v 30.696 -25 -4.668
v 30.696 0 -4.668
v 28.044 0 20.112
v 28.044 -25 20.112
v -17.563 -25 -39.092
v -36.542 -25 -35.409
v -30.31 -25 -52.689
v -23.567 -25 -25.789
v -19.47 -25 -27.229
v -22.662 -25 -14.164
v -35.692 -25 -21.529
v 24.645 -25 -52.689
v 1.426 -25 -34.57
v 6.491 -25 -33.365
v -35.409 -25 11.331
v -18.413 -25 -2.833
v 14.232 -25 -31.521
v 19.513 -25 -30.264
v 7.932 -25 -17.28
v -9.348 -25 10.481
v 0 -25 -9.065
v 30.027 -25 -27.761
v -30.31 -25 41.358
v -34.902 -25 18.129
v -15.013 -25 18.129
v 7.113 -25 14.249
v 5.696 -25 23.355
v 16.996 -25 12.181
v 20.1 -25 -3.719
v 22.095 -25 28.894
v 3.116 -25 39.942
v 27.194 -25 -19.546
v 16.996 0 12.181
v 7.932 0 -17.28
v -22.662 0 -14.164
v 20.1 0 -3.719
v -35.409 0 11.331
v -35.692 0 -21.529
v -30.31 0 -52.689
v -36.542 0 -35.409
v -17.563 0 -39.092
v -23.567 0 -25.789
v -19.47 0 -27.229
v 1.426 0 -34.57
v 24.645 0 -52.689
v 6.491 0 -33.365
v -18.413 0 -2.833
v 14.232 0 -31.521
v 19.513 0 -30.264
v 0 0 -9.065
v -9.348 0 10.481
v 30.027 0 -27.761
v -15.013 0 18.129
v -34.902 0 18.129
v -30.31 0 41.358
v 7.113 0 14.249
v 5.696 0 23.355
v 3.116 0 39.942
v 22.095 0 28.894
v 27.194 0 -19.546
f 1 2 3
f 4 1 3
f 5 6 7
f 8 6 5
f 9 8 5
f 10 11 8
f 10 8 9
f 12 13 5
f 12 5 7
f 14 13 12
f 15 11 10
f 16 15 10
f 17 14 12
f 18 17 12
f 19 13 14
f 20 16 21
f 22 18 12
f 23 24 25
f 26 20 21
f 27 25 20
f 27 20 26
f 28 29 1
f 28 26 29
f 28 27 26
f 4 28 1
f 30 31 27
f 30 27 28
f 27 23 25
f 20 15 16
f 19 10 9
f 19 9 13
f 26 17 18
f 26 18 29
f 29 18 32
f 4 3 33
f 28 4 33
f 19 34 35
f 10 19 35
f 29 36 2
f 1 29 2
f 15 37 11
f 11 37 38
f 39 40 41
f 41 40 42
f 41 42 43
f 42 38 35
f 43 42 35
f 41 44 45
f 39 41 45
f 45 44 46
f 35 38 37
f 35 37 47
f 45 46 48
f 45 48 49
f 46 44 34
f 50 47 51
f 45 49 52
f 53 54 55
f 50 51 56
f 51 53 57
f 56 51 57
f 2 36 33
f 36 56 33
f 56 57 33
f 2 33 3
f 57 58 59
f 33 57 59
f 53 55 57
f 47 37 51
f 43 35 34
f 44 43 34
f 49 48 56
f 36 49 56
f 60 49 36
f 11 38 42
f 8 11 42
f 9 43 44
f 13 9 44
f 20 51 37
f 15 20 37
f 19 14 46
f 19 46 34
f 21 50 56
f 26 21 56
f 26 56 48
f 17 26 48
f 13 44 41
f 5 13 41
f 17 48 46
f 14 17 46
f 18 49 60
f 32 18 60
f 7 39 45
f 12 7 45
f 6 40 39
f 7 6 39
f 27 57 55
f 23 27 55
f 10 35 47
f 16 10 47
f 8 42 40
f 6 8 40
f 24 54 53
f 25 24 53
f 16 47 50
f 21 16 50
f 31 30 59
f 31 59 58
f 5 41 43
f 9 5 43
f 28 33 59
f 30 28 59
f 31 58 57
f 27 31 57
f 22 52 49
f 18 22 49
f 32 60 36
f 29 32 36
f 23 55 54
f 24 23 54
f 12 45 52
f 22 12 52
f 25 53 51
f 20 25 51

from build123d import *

# Parameters (mm, degrees)
F1_DEPTH = 25


with BuildPart() as f1:
    # F0 (on Front) → F1 (new body)
    with BuildSketch(Plane.XZ):
        Polygon((9.3355238921, 21.5350252004), (5.696185278, 23.3546947243), (7.112640961, 14.2489086105), align=None)
        Polygon((3.1160083599, 39.9415455759), (5.696185278, 23.3546947243), (9.3355238921, 21.5350252004), (7.112640961, 14.2489086105), (14.2324656675, -31.5213909643), (19.5127929437, -30.2641700858), (27.1942447871, -19.5458643138), (20.0996515075, -3.7194623682), (30.695501842, -4.6683449843), (28.0440635979, 20.1124101877), (16.9964041561, 12.1807558462), (22.0953244716, 28.8938842714), align=None)
        Polygon((5.696185278, 23.3546947243), (-30.3102526814, 41.3579158485), (-34.9019161013, 18.1294977665), (-15.0134898722, 18.1294977665), (-9.3480218202, 10.4811154306), (-35.4091748595, 11.3309361041), (-35.6924459338, -21.5287767351), (-23.5665350946, -25.7892328121), (-20.1124101877, -23.2284162194), (-19.4695026466, -27.2287310092), (1.4262612845, -34.5704874846), (6.4912185709, -33.3645451792), (7.9316552728, -17.279677093), (-22.6618722081, -14.1636701301), (-18.4127707034, -2.832734026), (0, -9.0647488832), (7.112640961, 14.2489086105), align=None)
        Polygon((-23.5665350946, -25.7892328121), (-19.4695026466, -27.2287310092), (-20.1124101877, -23.2284162194), align=None)
        Polygon((19.5127929437, -30.2641700858), (14.2324656675, -31.5213909643), (15.0134908035, -36.5422666073), align=None)
        Polygon((6.2320139259, -36.258995533), (6.4912185709, -33.3645451792), (1.4262612845, -34.5704874846), align=None)
        Polygon((15.0134908035, -36.5422666073), (14.2324656675, -31.5213909643), (6.4912185709, -33.3645451792), (6.2320139259, -36.258995533), (1.4262612845, -34.5704874846), (-17.56295003, -39.0917286277), (-19.4695026466, -27.2287310092), (-23.5665350946, -25.7892328121), (-36.5422666073, -35.4091711342), (-30.3102526814, -52.6888519526), (24.6447846293, -52.6888519526), (30.0269778818, -27.7607925236), (19.5127929437, -30.2641700858), align=None)
    extrude(amount=F1_DEPTH)


solid = f1.part
